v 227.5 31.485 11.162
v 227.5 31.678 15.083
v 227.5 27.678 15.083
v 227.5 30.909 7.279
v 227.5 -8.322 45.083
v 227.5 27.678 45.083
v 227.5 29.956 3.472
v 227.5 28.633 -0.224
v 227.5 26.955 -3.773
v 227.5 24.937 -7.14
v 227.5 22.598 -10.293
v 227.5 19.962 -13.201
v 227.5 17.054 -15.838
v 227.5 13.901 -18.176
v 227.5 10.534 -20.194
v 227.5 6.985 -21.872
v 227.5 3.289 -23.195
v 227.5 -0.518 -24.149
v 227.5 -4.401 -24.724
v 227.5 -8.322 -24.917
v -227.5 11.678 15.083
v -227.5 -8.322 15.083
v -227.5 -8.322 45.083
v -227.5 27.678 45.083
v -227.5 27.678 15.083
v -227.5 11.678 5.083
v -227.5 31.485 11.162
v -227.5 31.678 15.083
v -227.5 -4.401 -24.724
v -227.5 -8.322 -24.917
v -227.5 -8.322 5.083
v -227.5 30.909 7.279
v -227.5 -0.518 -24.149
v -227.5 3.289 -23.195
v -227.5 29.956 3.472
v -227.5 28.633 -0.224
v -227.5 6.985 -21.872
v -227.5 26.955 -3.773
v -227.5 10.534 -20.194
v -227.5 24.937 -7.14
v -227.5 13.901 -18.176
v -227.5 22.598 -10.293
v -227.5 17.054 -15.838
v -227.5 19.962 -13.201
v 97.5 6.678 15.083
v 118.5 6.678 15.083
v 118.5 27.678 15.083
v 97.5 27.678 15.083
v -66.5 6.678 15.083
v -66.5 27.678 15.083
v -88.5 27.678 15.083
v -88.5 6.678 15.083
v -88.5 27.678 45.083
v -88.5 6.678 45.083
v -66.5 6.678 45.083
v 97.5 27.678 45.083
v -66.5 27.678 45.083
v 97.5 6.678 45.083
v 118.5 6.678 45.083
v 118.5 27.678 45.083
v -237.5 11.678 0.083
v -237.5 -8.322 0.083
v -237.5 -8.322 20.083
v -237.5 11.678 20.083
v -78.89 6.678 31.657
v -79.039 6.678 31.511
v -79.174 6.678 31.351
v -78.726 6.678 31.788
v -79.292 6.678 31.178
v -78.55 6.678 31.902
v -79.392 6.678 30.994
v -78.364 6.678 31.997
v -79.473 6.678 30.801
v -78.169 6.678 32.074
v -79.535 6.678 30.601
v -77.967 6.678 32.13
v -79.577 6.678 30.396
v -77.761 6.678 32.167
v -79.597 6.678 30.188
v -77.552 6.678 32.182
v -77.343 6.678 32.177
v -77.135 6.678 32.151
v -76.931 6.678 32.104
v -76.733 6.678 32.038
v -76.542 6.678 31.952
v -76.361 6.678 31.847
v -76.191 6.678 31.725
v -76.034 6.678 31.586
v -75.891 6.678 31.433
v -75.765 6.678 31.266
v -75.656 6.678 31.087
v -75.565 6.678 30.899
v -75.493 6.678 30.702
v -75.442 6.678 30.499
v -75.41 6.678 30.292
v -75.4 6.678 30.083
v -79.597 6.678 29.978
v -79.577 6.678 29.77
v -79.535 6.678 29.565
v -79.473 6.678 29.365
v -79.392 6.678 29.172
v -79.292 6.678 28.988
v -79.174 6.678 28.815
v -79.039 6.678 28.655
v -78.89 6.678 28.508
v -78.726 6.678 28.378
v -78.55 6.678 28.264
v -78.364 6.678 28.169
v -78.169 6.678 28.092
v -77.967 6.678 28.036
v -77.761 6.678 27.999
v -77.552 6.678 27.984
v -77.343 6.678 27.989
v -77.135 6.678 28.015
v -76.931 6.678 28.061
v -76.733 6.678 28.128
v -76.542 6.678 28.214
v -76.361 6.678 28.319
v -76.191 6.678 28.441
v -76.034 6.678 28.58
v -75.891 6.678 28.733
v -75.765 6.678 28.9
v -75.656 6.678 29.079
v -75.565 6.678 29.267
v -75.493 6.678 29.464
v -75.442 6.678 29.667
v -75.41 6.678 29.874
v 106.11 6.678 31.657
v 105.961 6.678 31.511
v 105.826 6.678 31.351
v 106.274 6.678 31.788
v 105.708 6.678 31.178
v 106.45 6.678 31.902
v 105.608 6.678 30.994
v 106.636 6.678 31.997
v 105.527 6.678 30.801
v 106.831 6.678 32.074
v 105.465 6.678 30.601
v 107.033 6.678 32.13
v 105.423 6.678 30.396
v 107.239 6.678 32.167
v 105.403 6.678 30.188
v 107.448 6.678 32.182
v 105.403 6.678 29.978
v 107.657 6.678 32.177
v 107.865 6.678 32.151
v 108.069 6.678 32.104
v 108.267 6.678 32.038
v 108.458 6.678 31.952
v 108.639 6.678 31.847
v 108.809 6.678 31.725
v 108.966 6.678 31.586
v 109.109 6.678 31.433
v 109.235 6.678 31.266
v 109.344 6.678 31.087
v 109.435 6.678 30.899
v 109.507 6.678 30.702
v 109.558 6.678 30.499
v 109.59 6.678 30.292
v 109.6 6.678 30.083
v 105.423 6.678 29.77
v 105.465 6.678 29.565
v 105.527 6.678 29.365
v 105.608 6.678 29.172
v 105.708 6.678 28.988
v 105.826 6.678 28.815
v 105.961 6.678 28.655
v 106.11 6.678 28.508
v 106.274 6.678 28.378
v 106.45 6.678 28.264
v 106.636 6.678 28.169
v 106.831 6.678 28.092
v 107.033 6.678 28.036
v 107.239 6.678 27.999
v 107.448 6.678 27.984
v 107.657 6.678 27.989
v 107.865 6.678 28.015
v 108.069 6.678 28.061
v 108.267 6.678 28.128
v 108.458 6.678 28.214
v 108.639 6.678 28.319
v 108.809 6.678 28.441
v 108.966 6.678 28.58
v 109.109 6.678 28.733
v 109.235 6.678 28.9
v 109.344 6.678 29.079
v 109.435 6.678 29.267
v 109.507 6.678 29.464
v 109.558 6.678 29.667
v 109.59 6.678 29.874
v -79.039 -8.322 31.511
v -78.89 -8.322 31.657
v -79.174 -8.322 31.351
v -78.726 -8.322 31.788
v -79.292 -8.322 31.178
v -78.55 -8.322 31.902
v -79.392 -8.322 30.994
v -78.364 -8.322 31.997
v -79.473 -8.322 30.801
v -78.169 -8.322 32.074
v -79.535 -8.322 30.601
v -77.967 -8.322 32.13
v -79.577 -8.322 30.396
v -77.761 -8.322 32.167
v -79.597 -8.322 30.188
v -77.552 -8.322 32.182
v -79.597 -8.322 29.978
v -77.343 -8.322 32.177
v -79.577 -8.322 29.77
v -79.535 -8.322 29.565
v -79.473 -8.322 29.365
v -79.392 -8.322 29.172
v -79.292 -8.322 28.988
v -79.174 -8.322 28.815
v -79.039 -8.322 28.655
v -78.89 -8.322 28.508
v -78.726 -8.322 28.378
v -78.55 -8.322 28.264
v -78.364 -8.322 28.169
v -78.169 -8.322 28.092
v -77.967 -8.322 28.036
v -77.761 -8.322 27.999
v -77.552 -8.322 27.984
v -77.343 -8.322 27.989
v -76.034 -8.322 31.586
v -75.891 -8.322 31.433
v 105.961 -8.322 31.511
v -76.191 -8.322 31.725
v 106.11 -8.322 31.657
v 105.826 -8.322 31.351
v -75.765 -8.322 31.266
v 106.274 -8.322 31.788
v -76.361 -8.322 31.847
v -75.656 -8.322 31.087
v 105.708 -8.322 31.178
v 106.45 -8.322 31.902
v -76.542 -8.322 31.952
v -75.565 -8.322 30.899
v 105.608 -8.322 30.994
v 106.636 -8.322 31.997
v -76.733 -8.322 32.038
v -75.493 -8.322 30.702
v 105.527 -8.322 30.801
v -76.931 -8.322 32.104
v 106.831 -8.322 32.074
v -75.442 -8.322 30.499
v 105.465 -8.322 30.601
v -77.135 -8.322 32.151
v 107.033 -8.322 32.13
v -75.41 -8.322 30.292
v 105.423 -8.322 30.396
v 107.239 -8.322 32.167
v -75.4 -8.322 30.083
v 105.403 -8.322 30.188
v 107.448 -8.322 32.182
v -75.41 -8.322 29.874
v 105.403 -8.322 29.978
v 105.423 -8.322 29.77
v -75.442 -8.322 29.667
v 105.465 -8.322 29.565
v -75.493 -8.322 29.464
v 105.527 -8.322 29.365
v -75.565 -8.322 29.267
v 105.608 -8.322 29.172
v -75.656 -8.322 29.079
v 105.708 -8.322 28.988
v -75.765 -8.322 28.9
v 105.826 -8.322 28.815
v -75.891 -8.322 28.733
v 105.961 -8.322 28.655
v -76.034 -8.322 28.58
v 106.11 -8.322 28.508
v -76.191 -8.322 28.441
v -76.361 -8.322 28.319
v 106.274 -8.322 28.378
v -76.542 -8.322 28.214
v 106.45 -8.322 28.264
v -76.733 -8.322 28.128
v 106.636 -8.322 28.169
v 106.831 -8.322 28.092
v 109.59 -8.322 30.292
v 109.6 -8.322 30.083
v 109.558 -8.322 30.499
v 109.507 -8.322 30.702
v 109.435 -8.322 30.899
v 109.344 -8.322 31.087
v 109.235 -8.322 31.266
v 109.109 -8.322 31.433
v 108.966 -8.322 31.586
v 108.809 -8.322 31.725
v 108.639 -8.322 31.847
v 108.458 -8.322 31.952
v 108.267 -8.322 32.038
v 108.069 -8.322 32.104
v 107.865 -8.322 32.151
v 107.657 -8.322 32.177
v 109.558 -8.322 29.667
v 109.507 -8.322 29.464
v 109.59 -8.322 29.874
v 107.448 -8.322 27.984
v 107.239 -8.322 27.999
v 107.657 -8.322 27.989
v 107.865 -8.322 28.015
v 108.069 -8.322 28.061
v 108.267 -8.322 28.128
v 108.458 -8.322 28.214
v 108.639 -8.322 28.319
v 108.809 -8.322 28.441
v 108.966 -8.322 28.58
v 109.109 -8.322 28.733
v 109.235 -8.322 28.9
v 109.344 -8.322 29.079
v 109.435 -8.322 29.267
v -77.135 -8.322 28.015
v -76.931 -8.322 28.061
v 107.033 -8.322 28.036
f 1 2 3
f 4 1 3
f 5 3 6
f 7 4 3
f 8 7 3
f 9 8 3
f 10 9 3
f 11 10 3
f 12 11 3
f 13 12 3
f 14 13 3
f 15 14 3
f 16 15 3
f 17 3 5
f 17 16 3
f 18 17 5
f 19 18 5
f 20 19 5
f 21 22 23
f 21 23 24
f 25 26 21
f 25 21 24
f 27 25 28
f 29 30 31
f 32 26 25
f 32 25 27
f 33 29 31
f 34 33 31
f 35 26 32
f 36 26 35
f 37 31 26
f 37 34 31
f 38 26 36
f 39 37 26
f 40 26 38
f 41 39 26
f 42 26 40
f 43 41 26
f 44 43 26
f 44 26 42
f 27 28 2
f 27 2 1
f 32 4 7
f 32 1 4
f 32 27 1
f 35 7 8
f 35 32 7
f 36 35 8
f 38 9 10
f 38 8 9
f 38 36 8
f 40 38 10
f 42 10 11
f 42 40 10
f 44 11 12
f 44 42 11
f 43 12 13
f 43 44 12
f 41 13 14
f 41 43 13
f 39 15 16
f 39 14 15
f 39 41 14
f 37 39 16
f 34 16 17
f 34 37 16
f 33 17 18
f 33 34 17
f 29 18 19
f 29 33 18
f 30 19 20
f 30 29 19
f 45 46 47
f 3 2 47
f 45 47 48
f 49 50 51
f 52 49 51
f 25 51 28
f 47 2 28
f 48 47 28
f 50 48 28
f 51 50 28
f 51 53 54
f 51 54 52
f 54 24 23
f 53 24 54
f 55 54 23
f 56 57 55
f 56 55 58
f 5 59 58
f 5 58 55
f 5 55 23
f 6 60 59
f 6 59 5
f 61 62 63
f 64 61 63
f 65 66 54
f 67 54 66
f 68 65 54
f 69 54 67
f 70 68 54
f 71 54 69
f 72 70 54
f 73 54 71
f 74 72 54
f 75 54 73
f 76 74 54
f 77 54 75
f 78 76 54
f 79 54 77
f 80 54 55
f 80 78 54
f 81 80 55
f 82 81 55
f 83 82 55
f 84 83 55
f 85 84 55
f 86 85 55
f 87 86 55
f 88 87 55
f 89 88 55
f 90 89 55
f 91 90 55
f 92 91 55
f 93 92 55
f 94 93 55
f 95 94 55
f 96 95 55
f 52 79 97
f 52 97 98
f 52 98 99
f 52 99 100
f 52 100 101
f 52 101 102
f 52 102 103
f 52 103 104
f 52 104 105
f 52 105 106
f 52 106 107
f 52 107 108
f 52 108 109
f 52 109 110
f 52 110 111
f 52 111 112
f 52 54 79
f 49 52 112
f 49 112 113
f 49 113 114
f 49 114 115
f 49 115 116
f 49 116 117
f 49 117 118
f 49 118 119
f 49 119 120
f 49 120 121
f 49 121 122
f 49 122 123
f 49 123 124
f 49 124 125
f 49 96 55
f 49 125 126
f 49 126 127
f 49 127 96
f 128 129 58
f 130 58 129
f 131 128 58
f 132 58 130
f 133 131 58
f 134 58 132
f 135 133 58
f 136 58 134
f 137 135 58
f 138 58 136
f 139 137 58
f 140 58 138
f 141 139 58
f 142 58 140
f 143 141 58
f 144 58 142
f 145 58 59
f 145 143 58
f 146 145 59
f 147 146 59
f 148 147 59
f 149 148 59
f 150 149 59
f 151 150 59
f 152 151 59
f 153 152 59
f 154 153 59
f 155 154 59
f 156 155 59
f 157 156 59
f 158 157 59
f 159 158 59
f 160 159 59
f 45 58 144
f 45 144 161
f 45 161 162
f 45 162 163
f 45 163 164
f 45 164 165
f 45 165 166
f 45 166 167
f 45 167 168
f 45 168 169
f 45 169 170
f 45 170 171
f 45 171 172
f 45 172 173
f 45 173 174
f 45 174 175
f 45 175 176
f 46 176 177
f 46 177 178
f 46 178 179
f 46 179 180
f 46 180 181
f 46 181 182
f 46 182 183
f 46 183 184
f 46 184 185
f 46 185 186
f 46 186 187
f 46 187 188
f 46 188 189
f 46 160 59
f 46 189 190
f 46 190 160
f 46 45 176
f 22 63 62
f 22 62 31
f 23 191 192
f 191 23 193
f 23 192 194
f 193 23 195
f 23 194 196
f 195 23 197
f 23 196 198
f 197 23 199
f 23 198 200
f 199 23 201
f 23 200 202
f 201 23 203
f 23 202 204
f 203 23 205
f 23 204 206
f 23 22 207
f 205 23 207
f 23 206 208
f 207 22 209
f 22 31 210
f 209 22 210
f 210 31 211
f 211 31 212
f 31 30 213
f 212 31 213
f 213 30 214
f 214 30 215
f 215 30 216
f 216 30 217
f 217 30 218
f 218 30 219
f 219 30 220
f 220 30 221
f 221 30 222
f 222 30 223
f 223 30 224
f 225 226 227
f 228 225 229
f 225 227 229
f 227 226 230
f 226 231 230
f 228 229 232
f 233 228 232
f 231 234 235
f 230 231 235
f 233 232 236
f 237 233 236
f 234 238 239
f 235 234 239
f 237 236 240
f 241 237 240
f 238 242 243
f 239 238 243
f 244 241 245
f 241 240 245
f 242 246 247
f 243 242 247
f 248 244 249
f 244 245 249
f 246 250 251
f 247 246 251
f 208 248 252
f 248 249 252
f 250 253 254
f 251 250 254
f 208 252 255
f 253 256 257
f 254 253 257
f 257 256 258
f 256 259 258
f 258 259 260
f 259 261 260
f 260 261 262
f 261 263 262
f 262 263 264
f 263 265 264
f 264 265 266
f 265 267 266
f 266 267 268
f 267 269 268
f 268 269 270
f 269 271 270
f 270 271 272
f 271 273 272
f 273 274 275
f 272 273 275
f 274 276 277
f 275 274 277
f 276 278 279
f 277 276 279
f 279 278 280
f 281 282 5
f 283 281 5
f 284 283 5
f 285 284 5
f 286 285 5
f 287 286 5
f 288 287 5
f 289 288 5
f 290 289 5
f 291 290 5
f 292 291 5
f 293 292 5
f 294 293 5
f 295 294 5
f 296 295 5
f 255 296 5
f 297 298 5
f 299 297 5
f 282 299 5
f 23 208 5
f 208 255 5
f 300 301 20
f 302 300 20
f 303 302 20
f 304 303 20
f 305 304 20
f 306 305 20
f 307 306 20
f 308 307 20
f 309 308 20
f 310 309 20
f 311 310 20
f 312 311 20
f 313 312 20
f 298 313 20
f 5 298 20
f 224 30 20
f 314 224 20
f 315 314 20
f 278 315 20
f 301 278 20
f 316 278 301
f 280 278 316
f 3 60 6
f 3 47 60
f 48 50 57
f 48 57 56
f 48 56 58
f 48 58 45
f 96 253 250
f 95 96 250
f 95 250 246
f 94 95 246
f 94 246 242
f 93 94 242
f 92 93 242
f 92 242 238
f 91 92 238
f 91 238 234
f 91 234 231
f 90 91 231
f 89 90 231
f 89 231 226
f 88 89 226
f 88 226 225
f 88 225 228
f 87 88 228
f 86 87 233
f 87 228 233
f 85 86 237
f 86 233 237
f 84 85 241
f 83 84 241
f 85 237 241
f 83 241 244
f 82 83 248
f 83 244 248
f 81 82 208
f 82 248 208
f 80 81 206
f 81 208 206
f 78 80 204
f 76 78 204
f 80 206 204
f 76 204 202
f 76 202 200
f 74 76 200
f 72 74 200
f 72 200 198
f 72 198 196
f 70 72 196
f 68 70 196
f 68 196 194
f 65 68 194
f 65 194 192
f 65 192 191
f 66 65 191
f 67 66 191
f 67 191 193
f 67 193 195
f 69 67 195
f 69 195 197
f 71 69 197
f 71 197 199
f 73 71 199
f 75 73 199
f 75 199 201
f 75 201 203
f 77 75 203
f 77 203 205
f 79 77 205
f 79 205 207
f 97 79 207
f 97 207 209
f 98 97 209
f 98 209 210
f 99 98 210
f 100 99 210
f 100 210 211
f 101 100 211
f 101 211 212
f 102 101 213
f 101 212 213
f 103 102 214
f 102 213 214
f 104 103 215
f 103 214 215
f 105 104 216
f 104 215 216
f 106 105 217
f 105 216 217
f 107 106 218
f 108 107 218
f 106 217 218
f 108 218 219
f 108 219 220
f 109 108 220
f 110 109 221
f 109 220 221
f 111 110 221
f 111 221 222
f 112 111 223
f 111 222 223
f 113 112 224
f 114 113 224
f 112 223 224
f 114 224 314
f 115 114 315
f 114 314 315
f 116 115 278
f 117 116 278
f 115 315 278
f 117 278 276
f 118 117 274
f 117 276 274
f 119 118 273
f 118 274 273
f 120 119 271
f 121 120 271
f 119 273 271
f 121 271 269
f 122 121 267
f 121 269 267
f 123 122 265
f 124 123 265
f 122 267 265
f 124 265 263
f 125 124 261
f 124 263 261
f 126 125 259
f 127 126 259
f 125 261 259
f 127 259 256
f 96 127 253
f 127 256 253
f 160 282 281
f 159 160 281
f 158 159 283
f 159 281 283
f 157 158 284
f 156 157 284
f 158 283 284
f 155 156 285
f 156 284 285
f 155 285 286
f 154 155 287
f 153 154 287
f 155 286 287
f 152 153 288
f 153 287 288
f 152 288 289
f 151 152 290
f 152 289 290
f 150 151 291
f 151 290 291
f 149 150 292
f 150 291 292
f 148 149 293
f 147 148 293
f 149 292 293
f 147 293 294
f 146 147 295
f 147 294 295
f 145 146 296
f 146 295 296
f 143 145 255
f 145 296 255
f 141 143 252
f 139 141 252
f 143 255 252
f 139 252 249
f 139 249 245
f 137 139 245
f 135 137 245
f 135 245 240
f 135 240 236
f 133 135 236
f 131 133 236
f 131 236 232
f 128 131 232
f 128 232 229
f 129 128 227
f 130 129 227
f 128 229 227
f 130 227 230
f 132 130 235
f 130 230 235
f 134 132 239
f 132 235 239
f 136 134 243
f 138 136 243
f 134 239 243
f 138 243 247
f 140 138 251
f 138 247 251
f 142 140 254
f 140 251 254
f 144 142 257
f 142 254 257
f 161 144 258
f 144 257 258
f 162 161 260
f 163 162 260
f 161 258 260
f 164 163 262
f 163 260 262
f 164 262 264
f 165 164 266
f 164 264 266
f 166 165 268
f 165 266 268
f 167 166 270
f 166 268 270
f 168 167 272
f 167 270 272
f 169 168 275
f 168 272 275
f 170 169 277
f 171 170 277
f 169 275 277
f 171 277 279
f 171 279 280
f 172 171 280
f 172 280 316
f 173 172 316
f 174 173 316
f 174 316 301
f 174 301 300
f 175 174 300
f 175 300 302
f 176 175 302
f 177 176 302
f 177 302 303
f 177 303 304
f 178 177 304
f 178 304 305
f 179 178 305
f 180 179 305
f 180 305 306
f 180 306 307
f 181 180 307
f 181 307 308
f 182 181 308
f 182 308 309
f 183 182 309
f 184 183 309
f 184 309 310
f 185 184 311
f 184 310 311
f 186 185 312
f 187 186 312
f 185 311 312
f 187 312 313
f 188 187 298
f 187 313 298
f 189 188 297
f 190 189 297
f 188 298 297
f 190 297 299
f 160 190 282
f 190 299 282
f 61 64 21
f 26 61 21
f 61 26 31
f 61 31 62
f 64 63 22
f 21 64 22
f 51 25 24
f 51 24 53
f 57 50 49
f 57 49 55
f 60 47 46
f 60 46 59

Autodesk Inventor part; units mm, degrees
ref_plane "YZ Plane" through (0, 0, 0) normal (1, 0, 0) x (0, 1, 0)
ref_plane "XZ Plane" through (0, 0, 0) normal (0, 1, 0) x (-1, 0, 0)
ref_plane "XY Plane" through (0, 0, 0) normal (0, 0, 1) x (1, 0, 0)
sketch "Эскиз1" plane through (0, 0, 0) normal (1, 0, 0) x (0, 1, 0)
  line L0 (-8.3221, -24.9171) -> (-8.3221, 15.0829)
  line L1 (-8.3221, 15.0829) -> (31.6779, 15.0829)
  arc A0 (-8.3221, -24.9171) -> (31.6779, 15.0829) centre (-8.3221, 15.0829) ccw
  point P0 (0, 0)
  dimension "d1" = 40
extrude "Выдавливание1" add sketch "Эскиз1" along normal mid plane 455
sketch "Эскиз3" plane through (-227.5, -8.3221, 15.0829) normal (0, 0, 1) x (1, 0, 0)
  line L0 (0, 0) -> (455, 0) projected
  line L1 (455, 40) -> (455, 0) projected
  line L2 (455, 40) -> (0, 40) projected
  line L3 (0, 0) -> (0, 40) projected
  point P0 (227.5, 8.3221)
extrude "Выдавливание2" add sketch "Эскиз3" along normal blind 30
sketch "Эскиз4" plane through (-227.5, 31.6779, 15.0829) normal (0, 1, 0) x (1, 0, 0)
  line L0 (455, 0) -> (0, 0) projected
  line L1 (0, 0) -> (0, -30) projected
  line L2 (455, -30) -> (0, -30) projected
  line L3 (455, 0) -> (455, -30) projected
  point P0 (227.5, 15.0829)
extrude "Выдавливание3" cut sketch "Эскиз4" against normal blind 4
sketch "Эскиз6" plane through (-227.5, 27.6779, 15.0829) normal (0, 1, 0) x (1, 0, 0)
  line L0 (0, 40) -> (0, -30) projected
  line L1 (0, -14.536) -> (200.0528, -14.536) construction
  line L2 (455, 0) -> (0, 0) projected
  circle A0 centre (10.061, -14.536) radius 8.0645
  circle A1 centre (37.061, -14.536) radius 8.0645
  circle A2 centre (64.061, -14.536) radius 8.0645
  circle A3 centre (91.061, -14.536) radius 8.0645
  circle A4 centre (118.061, -14.536) radius 8.0645
  circle A5 centre (145.061, -14.536) radius 8.0645
  circle A6 centre (172.061, -14.536) radius 8.0645
  point P0 (227.5, 15.0829)
  dimension "d21" = 14.536
  dimension "d22" = 16.129
  dimension "d23" = 10.061
  dimension "d26" = 27
extrude "Выдавливание5" [suppressed]
sketch "Эскиз8" plane through (-227.5, -8.3221, -24.9171) normal (0, -1, 0) x (1, 0, 0)
  line L0 (455, 50) -> (465, 55)
  line L1 (465, 55) -> (465, 35)
  line L2 (465, 35) -> (455, 40)
  line L3 (455, 0) -> (455, 70) projected
  point P0 (227.5, 24.9171)
  point P1 (465, 45)
  dimension "d33" = 20
  dimension "d34" = 10
  dimension "d35" = 20
  dimension "d36" = 15
  dimension "d37" = 10
extrude "Выдавливание6" [suppressed]
sketch "Эскиз9" plane through (-227.5, -8.3221, -24.9171) normal (0, -1, 0) x (1, 0, 0)
  line L0 (210, 40) -> (220, 45)
  line L1 (220, 45) -> (220, 25)
  line L2 (220, 25) -> (210, 30)
  line L3 (455, 0) -> (455, 70) projected
  line L4 (-10, 25) -> (-10, 45)
  line L5 (-10, 45) -> (0, 40)
  line L6 (0, 30) -> (-10, 25)
  line L7 (0, 0) -> (0, 70) projected
  point P0 (227.5, 24.9171)
extrude "Выдавливание7" [suppressed]
sketch "Эскиз10" plane through (-227.5, -8.3221, -24.9171) normal (0, -1, 0) x (1, 0, 0)
  line L0 (-10, 45) -> (0, 40)
  line L1 (-10, 25) -> (-10, 45)
  line L2 (0, 30) -> (-10, 25)
  line L3 (0, 0) -> (0, 70) projected
  point P0 (227.5, 24.9171)
extrude "Выдавливание8" add sketch "Эскиз10" against normal blind 20
sketch "Эскиз11" plane through (-227.5, -8.3221, -24.9171) normal (0, -1, 0) x (1, 0, 0)
  line L0 (0, 70) -> (455, 70) projected
  line L1 (0, 0) -> (455, 0) projected
  line L2 (0, 40) -> (455, 40) projected
  point P0 (227.5, 24.9171)
feature "Разделение1" [suppressed]
sketch "Эскиз14" plane through (-227.5, 27.6779, 15.0829) normal (0, 1, 0) x (1, 0, 0)
  line L0 (0, 0) -> (455, 0) projected
  line L1 (0, -30) -> (455, -30) projected
  line L2 (134.048, 0) -> (100.336, 0)
  line L3 (100.336, 0) -> (100.336, -30) construction
  line L4 (100.336, -30) -> (134.048, -30)
  line L5 (134.048, -30) -> (134.048, 0)
  line L6 (105, 0) -> (105, -320)
  line L7 (319.048, 0) -> (285.336, 0)
  line L8 (285.336, -30) -> (319.048, -30)
  line L9 (319.048, -30) -> (319.048, 0)
  line L10 (290, 0) -> (290, -320)
  point P0 (227.5, 15.0829)
  point P1 (105, -30)
  point P2 (134.048, -30)
  point P3 (290, -30)
  point P4 (319.048, -30)
  dimension "d71" = 33.712
  dimension "d72" = 4.664
  dimension "d75" = 185
extrude "Выдавливание10" [suppressed]
ref_plane "РабПлоскость1" through (-227.5, 31.6779, 30.0829) normal (0, 0, 1) x (1, 0, 0)
sketch "Эскиз16" plane through (-227.5, -8.3221, -24.9171) normal (0, -1, 0) x (1, 0, 0)
  circle A0 centre (115, 55) radius 2.529
  line L0 (-91, 55) -> (546, 55) construction
  line L1 (115, 360) -> (115, 40) construction
  line L2 (300, 360) -> (300, 40) construction
  circle A1 centre (300, 55) radius 2.529
  point P0 (227.5, 24.9171)
  dimension "d82" = 5.058
extrude "Выдавливание11" [suppressed]
sketch "Эскиз12" plane through (-227.5, 27.6779, 15.0829) normal (0, 1, 0) x (1, 0, 0)
  line L0 (0, 0) -> (455, 0) projected
  line L1 (248.041, 0) -> (248.041, -5)
  line L2 (248.041, -5) -> (264.217, -4.95)
  line L3 (264.217, -4.95) -> (264.217, -17.926)
  line L4 (264.217, -17.926) -> (248.041, -20.945)
  line L5 (248.041, -20.945) -> (248.041, -30)
  line L6 (0, -30) -> (455, -30) projected
  line L7 (227.5, 54) -> (227.5, -44) projected
  point P0 (227.5, 15.0829)
  dimension "d54" = 20.541
  dimension "d55" = 16.176
  dimension "d56" = 12.074
  dimension "d57" = 4.95
  dimension "d58" = 9.055
  dimension "d59" = 5
feature "Разделение2" [suppressed]
sketch "Эскиз13" plane through (-227.5, 27.6779, 15.0829) normal (0, 1, 0) x (1, 0, 0)
  line L0 (0, -30) -> (455, -30) projected
  line L1 (0, 0) -> (455, 0) projected
  line L2 (346, -30) -> (324, -30)
  line L3 (324, -30) -> (324, 0)
  line L4 (324, 0) -> (346, 0)
  line L5 (346, 0) -> (346, -30)
  line L6 (325, -320) -> (325, 0)
  line L7 (161, -30) -> (139, -30)
  line L8 (139, -30) -> (139, 0)
  line L9 (139, 0) -> (161, 0)
  line L10 (161, 0) -> (161, -30)
  point P0 (227.5, 15.0829)
  point P1 (325, -30)
  point P2 (346, 0)
  point P3 (161, 0)
  dimension "d60" = 22
  dimension "d61" = 1
  dimension "d66" = 185
extrude "Выдавливание9" cut sketch "Эскиз13" against normal blind 21 contours L8 L1 L10 L0 | L6 L1 L5 L0
sketch "Эскиз17" plane through (-227.5, -8.3221, -24.9171) normal (0, -1, 0) x (1, 0, 0)
  circle A0 centre (150, 55) radius 2.1
  line L0 (-91, 55) -> (546, 55) construction
  line L1 (150, 40) -> (150, 360) construction
  line L2 (335, 40) -> (335, 360) construction
  circle A1 centre (335, 55) radius 2.1
  point P0 (227.5, 24.9171)
  dimension "d85" = 4.2
extrude "Выдавливание12" cut sketch "Эскиз17" against normal up to next
sketch "Эскиз18" plane through (-227.5, 0, 0) normal (-1, 0, 0) x (0, 0, 1)
  arc A0 (15.0829, 17.6779) -> (-10.9171, -8.3221) centre (15.0829, -8.3221) ccw
  line L0 (-24.9171, -8.3221) -> (45.0829, -8.3221) projected
  arc A1 (15.0829, 27.6779) -> (-20.9171, -8.3221) centre (15.0829, -8.3221) ccw construction
  line L1 (45.0829, 27.6779) -> (15.0829, 27.6779) projected
  line L2 (15.0829, 17.6779) -> (15.0829, 27.6779) construction
  line L3 (45.0829, -8.3221) -> (45.0829, 27.6779) projected
  arc A2 (15.6159, 17.1393) -> (-10.3841, -8.3221) centre (15.0829, -8.3221) ccw
  line L4 (15.6159, 17.1393) -> (15.6159, 28.207)
  arc A3 (15.6159, 28.207) -> (-21.4501, -8.3221) centre (15.0829, -8.3221) ccw
  point P0 (0, 0)
  point P1 (15.0829, 17.6779)
  point P2 (-21.4501, -8.3221)
  point P3 (-10.3841, -8.3221)
  dimension "d94" = 0.533
extrude "Выдавливание13" [suppressed]
sketch "Эскиз19" plane through (-227.5, 27.6779, 15.0829) normal (0, 1, 0) x (1, 0, 0)
  line L0 (237.5, 0) -> (0, 0) projected
  line L1 (105, -30) -> (0, -30) projected
  line L2 (0, 0) -> (16.614, 0)
  line L3 (16.614, 0) -> (16.614, -30)
  line L4 (16.614, -30) -> (0, -30)
  line L5 (0, -30) -> (0, 0)
  point P0 (227.5, 15.0829)
  dimension "d90" = 16.614
extrude "Выдавливание14" [suppressed]
properties part number "Край задней части корпуса"
